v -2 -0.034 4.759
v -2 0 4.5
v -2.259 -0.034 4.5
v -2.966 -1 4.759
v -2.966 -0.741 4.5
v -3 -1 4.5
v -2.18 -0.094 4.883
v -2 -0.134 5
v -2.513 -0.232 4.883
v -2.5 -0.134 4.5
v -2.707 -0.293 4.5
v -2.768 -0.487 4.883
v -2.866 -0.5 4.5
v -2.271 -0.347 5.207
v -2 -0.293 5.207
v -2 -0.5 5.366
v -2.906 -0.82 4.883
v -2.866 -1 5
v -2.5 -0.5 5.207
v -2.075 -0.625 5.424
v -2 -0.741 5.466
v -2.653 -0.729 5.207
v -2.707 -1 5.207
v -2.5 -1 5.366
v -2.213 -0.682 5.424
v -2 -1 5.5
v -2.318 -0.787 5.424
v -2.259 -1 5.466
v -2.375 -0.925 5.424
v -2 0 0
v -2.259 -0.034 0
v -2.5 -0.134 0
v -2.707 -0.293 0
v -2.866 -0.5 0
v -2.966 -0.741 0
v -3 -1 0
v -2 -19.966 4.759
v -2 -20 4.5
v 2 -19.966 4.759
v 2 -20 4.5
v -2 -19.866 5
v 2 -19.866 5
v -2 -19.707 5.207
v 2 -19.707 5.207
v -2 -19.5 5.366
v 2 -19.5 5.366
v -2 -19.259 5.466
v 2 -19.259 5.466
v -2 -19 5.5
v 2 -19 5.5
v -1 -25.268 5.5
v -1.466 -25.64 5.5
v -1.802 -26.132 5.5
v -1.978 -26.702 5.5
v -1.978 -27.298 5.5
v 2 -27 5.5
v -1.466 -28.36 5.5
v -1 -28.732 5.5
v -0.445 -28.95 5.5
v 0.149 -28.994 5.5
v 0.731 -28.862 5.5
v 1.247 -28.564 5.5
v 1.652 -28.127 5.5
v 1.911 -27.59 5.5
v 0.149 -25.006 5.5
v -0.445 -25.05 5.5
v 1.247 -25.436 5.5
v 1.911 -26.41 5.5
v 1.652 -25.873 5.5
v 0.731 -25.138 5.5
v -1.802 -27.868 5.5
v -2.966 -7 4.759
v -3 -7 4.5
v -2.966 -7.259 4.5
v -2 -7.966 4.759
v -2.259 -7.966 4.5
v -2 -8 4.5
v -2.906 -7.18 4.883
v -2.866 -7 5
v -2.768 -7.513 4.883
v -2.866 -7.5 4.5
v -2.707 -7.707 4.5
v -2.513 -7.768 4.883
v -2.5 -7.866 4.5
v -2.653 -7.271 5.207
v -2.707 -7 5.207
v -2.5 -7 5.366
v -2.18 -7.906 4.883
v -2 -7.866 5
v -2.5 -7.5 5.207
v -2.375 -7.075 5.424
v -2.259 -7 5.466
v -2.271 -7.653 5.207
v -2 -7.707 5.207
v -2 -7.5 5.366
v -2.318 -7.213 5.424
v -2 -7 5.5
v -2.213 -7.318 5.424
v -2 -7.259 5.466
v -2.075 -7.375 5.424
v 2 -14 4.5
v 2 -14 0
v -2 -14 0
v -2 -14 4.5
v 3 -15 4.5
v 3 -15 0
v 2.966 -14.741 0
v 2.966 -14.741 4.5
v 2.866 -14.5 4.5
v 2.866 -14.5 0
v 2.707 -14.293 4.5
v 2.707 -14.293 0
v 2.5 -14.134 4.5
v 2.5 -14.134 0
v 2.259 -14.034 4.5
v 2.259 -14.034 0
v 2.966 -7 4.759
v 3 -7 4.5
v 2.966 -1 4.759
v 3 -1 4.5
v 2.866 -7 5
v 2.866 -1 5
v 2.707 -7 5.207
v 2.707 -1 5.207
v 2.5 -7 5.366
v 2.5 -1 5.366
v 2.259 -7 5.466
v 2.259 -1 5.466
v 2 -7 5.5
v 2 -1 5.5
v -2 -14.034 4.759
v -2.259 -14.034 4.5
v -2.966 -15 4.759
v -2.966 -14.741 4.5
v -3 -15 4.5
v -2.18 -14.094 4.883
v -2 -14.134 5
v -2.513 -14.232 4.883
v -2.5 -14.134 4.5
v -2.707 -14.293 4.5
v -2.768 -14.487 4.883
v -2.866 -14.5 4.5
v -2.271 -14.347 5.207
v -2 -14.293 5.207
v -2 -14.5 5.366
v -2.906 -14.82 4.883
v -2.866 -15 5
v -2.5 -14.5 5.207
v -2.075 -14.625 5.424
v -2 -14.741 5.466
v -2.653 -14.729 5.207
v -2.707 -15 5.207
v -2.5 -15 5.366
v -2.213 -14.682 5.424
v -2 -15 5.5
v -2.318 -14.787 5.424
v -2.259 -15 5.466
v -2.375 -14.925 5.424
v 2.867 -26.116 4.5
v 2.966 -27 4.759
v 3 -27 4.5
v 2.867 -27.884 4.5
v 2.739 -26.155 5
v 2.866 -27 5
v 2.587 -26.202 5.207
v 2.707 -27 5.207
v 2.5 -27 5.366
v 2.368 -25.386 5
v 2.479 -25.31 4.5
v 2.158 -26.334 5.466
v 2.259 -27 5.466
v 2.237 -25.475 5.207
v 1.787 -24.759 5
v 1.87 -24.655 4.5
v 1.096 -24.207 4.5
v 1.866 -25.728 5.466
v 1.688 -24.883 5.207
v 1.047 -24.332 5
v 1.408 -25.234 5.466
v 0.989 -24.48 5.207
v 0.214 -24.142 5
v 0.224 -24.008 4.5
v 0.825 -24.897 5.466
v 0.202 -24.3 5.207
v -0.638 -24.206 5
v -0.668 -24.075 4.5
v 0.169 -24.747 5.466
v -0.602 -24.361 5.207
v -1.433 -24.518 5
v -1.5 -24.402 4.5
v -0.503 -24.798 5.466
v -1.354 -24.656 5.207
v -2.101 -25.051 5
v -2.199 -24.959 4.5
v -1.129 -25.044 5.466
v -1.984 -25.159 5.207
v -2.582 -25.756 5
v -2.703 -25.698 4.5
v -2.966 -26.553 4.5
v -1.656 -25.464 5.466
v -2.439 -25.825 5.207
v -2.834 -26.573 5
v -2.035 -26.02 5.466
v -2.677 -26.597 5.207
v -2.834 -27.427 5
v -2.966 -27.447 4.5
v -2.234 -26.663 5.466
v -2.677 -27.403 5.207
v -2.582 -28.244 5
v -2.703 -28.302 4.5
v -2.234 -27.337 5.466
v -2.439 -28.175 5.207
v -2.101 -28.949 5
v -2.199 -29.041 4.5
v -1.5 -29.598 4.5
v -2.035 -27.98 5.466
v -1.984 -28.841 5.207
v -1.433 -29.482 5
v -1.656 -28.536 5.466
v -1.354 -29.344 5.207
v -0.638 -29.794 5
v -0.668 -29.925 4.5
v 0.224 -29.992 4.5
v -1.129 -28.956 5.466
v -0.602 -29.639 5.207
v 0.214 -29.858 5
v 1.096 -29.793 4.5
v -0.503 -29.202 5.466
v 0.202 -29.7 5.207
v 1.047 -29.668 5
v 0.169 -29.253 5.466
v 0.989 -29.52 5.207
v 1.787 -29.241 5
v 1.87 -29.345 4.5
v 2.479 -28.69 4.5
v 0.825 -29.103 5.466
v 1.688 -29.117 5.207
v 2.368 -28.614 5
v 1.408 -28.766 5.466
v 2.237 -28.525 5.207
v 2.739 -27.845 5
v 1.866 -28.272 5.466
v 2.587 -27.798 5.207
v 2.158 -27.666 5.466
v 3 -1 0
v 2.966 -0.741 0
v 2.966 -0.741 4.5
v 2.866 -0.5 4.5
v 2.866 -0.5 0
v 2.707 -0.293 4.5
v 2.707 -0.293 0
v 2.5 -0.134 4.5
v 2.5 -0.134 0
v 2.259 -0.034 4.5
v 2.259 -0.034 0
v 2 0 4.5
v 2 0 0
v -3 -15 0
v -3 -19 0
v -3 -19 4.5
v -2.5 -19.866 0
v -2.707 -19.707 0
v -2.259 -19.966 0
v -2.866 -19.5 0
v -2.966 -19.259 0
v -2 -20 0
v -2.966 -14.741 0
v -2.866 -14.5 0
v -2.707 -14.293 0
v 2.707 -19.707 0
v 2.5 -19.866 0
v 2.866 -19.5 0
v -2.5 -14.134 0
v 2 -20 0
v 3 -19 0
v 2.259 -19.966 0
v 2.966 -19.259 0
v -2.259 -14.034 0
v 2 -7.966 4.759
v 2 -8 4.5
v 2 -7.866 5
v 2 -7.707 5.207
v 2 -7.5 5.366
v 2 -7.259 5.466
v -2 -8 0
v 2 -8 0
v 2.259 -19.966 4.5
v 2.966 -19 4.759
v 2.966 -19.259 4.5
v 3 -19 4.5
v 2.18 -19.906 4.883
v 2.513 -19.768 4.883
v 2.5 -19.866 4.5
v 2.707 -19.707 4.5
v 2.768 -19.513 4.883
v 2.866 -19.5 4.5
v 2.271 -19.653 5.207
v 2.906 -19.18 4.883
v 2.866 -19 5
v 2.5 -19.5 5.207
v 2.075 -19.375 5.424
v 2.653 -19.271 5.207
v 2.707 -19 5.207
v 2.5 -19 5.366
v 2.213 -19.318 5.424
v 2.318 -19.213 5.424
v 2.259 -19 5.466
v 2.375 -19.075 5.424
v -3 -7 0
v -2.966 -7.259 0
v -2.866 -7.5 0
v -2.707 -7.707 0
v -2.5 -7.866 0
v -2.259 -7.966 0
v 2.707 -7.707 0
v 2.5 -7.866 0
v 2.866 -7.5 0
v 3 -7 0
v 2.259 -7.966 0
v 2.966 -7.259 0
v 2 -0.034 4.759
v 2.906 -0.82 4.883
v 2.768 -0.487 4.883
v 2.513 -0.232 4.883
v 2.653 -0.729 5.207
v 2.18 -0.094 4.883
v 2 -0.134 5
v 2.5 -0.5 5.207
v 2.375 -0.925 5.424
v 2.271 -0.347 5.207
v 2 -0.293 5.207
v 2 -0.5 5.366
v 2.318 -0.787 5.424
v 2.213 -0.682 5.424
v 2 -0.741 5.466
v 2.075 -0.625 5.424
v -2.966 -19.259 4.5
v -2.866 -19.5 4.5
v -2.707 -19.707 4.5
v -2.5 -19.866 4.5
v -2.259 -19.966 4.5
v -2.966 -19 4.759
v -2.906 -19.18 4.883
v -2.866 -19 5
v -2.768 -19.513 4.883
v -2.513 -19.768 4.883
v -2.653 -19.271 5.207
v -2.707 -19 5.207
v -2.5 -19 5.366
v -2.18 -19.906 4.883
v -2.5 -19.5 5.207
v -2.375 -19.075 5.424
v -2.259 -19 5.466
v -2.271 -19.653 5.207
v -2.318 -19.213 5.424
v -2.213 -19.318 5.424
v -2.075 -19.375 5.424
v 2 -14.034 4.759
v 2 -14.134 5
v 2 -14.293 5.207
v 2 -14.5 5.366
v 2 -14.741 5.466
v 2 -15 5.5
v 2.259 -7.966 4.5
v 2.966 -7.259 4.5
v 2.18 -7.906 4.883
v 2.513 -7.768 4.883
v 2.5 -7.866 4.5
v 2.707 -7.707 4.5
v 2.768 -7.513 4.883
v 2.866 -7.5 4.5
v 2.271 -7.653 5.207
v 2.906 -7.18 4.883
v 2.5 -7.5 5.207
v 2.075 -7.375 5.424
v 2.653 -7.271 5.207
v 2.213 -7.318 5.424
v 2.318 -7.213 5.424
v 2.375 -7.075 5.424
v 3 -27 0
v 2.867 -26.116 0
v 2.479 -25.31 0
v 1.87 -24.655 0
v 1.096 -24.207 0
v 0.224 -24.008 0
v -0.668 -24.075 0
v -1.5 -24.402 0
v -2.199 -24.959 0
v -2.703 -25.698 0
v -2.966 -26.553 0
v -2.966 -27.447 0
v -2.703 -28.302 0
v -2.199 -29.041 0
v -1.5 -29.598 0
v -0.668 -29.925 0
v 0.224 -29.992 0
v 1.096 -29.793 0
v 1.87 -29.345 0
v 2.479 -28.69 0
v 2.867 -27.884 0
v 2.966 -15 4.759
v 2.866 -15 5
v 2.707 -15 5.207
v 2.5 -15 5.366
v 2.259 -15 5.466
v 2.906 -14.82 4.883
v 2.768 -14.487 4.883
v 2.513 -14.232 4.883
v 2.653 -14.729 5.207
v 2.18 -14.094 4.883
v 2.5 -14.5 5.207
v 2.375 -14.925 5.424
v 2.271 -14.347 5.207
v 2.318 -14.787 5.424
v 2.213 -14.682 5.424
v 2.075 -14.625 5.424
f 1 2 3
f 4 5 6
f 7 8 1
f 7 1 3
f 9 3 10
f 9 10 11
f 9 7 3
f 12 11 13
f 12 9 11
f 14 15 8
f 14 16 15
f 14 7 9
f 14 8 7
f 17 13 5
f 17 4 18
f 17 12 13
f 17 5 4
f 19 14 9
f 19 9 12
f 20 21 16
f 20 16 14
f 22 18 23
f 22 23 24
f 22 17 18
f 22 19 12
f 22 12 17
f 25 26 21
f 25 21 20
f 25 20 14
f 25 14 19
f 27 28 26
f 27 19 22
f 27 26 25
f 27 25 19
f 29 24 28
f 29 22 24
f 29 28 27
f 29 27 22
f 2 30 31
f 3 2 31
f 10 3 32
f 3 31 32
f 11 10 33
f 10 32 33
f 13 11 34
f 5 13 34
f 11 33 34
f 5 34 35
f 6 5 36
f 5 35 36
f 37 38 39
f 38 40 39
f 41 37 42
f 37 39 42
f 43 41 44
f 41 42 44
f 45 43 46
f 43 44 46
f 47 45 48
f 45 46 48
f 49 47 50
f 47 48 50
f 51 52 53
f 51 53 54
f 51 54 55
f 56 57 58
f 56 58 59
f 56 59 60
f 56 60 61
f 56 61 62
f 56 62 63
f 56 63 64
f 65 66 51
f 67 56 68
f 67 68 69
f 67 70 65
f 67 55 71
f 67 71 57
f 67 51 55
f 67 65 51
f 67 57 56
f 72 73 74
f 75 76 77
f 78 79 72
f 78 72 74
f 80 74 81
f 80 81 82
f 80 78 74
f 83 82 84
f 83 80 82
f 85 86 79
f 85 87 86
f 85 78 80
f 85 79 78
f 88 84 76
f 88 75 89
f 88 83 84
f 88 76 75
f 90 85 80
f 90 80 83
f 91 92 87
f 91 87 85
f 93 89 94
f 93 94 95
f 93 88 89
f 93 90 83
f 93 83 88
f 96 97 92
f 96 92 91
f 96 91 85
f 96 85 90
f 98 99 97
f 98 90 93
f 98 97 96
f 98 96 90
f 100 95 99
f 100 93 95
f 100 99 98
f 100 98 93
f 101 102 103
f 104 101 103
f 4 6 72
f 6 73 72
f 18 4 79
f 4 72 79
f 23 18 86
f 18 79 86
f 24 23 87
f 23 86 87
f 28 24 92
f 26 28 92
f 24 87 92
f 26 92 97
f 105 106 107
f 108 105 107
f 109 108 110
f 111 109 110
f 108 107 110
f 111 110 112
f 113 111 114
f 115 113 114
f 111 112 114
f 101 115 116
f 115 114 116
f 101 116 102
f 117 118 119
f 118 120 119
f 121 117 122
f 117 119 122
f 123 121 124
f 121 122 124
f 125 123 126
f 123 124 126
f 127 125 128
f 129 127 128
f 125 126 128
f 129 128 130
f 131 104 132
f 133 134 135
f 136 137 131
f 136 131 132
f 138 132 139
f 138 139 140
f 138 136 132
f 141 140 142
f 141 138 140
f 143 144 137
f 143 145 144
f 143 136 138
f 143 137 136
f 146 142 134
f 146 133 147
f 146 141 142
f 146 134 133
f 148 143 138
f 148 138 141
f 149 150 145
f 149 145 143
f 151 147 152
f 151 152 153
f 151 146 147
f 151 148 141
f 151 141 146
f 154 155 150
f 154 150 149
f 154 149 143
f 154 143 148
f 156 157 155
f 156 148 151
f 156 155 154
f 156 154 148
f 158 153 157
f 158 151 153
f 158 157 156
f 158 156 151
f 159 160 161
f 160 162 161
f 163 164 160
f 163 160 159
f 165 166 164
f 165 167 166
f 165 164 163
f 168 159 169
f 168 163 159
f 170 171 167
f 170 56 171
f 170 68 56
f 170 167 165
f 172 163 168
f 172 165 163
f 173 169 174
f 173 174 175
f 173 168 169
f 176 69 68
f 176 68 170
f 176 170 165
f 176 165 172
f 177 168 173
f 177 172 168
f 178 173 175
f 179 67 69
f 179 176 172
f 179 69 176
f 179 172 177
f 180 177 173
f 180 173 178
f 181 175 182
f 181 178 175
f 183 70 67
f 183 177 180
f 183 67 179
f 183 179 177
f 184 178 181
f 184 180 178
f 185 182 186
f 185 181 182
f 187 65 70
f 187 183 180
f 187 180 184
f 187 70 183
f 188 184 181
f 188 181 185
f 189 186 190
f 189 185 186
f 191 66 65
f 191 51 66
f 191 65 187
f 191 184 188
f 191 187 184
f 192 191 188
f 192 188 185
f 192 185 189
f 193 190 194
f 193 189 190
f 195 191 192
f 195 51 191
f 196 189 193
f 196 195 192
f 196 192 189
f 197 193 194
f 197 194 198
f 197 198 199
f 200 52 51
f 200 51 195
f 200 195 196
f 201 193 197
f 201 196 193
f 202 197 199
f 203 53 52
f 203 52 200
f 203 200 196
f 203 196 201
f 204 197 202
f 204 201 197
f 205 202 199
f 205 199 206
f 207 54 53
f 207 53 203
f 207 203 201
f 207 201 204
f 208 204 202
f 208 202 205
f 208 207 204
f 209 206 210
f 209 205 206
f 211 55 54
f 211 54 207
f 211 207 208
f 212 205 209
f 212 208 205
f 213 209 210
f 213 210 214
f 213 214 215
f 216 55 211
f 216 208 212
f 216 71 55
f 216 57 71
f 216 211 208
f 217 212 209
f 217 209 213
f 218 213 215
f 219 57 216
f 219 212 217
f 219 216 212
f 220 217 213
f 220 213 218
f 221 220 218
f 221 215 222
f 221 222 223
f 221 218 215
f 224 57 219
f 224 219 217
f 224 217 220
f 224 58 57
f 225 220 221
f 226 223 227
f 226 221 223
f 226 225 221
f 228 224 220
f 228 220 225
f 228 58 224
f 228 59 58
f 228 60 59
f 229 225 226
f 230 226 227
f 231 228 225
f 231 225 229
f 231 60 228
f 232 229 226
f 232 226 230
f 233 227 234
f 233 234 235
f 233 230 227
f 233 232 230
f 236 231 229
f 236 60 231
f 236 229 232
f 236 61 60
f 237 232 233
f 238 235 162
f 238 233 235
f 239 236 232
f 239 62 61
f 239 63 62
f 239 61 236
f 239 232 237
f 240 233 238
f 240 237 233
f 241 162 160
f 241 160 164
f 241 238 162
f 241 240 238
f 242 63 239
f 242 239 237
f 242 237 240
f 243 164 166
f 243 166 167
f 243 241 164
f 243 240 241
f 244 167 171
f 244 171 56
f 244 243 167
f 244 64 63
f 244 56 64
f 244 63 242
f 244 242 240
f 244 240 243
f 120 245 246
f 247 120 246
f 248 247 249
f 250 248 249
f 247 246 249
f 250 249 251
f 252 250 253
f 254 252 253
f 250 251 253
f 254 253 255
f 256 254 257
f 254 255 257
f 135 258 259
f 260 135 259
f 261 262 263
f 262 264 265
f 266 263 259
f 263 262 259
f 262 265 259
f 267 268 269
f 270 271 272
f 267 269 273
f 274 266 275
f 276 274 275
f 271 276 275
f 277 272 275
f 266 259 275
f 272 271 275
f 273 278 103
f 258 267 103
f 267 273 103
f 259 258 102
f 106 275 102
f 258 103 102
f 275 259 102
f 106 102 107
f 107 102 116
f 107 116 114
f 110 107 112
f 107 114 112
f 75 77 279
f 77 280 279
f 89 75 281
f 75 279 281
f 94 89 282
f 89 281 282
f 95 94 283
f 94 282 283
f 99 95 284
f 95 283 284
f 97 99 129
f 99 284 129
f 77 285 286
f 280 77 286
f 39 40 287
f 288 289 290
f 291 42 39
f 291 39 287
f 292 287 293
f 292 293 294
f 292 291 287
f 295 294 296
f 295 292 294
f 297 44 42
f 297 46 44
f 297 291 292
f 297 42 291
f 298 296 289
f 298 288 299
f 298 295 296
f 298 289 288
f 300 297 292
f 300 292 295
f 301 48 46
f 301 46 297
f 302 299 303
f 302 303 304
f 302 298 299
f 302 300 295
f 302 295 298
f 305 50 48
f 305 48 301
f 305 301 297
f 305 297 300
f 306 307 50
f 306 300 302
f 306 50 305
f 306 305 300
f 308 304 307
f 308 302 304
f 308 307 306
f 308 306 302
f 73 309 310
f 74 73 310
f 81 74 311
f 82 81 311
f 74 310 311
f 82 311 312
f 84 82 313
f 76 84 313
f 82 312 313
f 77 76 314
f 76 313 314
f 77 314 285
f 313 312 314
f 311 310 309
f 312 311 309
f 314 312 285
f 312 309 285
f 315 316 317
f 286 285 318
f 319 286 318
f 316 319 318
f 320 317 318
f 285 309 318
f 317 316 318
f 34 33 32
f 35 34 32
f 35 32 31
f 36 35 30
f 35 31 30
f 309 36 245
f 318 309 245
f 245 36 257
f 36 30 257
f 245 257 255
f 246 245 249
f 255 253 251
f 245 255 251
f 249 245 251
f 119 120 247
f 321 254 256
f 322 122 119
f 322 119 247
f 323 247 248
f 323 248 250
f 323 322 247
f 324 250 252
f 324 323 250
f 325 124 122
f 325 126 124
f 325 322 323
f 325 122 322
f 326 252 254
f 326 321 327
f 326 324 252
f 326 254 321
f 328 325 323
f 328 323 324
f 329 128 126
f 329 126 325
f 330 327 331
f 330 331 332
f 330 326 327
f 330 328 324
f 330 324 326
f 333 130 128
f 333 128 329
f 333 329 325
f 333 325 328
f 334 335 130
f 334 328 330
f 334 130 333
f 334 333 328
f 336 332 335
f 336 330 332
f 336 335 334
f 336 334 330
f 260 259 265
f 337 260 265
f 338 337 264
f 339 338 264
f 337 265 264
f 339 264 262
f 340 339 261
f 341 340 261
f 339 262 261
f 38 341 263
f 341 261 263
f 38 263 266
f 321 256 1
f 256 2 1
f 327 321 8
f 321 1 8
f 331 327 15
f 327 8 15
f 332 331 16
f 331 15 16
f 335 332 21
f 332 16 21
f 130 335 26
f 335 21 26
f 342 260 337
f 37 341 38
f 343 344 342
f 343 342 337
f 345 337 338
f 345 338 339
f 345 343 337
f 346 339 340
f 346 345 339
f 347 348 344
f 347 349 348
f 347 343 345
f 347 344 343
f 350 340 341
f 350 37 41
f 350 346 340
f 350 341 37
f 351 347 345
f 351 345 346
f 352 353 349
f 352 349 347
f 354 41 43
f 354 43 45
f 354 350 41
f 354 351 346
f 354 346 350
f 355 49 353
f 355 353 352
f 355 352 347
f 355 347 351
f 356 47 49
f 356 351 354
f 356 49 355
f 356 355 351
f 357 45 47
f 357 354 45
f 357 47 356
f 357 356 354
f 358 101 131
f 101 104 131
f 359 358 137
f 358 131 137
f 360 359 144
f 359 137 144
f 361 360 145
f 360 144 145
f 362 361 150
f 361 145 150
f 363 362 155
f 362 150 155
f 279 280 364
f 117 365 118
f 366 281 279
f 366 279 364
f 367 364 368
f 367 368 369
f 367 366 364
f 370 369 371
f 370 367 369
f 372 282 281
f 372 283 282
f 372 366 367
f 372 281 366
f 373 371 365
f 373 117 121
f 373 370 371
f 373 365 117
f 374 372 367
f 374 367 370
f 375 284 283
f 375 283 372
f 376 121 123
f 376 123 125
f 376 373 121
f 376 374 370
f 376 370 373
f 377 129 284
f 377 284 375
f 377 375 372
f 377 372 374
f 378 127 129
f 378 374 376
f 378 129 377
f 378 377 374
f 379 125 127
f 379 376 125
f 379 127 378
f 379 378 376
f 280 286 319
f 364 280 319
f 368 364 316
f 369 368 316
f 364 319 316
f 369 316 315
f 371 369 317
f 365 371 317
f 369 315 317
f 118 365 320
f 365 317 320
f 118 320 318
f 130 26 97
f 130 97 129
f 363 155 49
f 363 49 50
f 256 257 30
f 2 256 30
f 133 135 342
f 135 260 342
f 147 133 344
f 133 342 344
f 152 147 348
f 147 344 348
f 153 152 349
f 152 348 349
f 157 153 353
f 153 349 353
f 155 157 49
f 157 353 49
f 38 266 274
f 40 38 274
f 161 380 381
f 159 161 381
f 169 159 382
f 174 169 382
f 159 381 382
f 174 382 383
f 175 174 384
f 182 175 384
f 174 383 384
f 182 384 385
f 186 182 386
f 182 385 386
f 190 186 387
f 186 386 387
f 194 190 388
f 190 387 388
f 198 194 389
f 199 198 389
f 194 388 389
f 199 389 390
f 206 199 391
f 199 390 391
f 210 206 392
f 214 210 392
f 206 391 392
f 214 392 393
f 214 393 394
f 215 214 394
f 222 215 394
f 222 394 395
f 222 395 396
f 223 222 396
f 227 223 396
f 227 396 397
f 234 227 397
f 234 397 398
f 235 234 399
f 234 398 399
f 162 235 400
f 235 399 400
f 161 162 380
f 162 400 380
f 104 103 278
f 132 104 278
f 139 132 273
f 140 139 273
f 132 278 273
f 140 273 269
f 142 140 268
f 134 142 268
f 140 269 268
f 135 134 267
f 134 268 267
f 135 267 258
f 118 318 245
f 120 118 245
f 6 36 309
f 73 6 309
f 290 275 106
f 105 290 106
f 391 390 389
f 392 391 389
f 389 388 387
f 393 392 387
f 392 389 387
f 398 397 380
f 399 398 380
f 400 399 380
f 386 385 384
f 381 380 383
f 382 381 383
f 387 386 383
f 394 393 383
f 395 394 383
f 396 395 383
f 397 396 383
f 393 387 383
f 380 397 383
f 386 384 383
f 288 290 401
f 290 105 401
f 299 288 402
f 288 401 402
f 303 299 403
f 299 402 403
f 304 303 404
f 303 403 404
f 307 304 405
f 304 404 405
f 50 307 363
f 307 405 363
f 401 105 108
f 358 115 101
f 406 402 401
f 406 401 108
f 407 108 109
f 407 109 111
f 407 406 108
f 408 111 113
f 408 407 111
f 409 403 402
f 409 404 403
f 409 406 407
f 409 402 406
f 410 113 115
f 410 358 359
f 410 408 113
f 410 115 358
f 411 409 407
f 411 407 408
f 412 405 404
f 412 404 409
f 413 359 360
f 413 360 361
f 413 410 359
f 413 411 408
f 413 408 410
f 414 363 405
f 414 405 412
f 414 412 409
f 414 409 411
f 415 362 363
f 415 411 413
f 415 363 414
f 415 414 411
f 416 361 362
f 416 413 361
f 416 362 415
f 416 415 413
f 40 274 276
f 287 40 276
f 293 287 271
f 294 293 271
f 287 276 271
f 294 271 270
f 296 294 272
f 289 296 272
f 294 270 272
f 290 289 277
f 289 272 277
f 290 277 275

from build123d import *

# Parameters (mm, degrees)
F1_DEPTH = 5.5
F2_DEPTH = 5.5
F0_R     = 3
F3_R     = 1
F4_R     = 1
F5_R     = 1


with BuildPart() as f1:
    # F0 (on Top) → F1 (new body)
    with BuildSketch(Plane.XY):
        with BuildLine():
            Line((2, 0), (-2, 0))
            ThreePointArc((-2, 0), (-2.7071067812, -0.2928932188), (-3, -1))
            Line((-3, -1), (-3, -7))
            ThreePointArc((-3, -7), (-2.7071067812, -7.7071067812), (-2, -8))
            Line((-2, -8), (2, -8))
            ThreePointArc((2, -8), (2.7071067812, -7.7071067812), (3, -7))
            Line((3, -7), (3, -1))
            ThreePointArc((3, -1), (2.7071067812, -0.2928932188), (2, 0))
        make_face()
    extrude(amount=F1_DEPTH)

    # F5
    f5_edges = [f1.edges().sort_by_distance(p)[0] for p in [
        (0, 0, 5.5),
        (-2.707107, -0.292893, 5.5),
        (-3, -4, 5.5),
        (-2.707107, -7.707107, 5.5),
        (0, -8, 5.5),
        (2.707107, -7.707107, 5.5),
        (3, -4, 5.5),
        (2.707107, -0.292893, 5.5),
    ]]
    fillet(f5_edges, radius=F5_R)


with BuildPart() as f2:
    # F0 (on Top) → F2 (new body)
    with BuildSketch(Plane.XY):
        with BuildLine():
            Line((2, -14), (-2, -14))
            ThreePointArc((-2, -14), (-2.7071067812, -14.2928932188), (-3, -15))
            Line((-3, -15), (-3, -19))
            ThreePointArc((-3, -19), (-2.7071067812, -19.7071067812), (-2, -20))
            Line((-2, -20), (2, -20))
            ThreePointArc((2, -20), (2.7071067812, -19.7071067812), (3, -19))
            Line((3, -19), (3, -15))
            ThreePointArc((3, -15), (2.7071067812, -14.2928932188), (2, -14))
        make_face()
    extrude(amount=F2_DEPTH)

    # F4
    f4_edges = [f2.edges().sort_by_distance(p)[0] for p in [
        (3, -17, 5.5),
        (2.707107, -14.292893, 5.5),
        (0, -14, 5.5),
        (-2.707107, -14.292893, 5.5),
        (-3, -17, 5.5),
        (-2.707107, -19.707107, 5.5),
        (0, -20, 5.5),
        (2.707107, -19.707107, 5.5),
    ]]
    fillet(f4_edges, radius=F4_R)


with BuildPart() as f2b:
    # F0 (on Top) → F2, piece 2 (new body)
    with BuildSketch(Plane.XY):
        with Locations((0, -27)):
            Circle(F0_R)
    extrude(amount=F2_DEPTH)

    # F3
    f3_edges = [f2b.edges().sort_by_distance(p)[0] for p in [
        (-3, -27, 5.5),
    ]]
    fillet(f3_edges, radius=F3_R)


solid = Compound([f1.part, f2.part, f2b.part])
